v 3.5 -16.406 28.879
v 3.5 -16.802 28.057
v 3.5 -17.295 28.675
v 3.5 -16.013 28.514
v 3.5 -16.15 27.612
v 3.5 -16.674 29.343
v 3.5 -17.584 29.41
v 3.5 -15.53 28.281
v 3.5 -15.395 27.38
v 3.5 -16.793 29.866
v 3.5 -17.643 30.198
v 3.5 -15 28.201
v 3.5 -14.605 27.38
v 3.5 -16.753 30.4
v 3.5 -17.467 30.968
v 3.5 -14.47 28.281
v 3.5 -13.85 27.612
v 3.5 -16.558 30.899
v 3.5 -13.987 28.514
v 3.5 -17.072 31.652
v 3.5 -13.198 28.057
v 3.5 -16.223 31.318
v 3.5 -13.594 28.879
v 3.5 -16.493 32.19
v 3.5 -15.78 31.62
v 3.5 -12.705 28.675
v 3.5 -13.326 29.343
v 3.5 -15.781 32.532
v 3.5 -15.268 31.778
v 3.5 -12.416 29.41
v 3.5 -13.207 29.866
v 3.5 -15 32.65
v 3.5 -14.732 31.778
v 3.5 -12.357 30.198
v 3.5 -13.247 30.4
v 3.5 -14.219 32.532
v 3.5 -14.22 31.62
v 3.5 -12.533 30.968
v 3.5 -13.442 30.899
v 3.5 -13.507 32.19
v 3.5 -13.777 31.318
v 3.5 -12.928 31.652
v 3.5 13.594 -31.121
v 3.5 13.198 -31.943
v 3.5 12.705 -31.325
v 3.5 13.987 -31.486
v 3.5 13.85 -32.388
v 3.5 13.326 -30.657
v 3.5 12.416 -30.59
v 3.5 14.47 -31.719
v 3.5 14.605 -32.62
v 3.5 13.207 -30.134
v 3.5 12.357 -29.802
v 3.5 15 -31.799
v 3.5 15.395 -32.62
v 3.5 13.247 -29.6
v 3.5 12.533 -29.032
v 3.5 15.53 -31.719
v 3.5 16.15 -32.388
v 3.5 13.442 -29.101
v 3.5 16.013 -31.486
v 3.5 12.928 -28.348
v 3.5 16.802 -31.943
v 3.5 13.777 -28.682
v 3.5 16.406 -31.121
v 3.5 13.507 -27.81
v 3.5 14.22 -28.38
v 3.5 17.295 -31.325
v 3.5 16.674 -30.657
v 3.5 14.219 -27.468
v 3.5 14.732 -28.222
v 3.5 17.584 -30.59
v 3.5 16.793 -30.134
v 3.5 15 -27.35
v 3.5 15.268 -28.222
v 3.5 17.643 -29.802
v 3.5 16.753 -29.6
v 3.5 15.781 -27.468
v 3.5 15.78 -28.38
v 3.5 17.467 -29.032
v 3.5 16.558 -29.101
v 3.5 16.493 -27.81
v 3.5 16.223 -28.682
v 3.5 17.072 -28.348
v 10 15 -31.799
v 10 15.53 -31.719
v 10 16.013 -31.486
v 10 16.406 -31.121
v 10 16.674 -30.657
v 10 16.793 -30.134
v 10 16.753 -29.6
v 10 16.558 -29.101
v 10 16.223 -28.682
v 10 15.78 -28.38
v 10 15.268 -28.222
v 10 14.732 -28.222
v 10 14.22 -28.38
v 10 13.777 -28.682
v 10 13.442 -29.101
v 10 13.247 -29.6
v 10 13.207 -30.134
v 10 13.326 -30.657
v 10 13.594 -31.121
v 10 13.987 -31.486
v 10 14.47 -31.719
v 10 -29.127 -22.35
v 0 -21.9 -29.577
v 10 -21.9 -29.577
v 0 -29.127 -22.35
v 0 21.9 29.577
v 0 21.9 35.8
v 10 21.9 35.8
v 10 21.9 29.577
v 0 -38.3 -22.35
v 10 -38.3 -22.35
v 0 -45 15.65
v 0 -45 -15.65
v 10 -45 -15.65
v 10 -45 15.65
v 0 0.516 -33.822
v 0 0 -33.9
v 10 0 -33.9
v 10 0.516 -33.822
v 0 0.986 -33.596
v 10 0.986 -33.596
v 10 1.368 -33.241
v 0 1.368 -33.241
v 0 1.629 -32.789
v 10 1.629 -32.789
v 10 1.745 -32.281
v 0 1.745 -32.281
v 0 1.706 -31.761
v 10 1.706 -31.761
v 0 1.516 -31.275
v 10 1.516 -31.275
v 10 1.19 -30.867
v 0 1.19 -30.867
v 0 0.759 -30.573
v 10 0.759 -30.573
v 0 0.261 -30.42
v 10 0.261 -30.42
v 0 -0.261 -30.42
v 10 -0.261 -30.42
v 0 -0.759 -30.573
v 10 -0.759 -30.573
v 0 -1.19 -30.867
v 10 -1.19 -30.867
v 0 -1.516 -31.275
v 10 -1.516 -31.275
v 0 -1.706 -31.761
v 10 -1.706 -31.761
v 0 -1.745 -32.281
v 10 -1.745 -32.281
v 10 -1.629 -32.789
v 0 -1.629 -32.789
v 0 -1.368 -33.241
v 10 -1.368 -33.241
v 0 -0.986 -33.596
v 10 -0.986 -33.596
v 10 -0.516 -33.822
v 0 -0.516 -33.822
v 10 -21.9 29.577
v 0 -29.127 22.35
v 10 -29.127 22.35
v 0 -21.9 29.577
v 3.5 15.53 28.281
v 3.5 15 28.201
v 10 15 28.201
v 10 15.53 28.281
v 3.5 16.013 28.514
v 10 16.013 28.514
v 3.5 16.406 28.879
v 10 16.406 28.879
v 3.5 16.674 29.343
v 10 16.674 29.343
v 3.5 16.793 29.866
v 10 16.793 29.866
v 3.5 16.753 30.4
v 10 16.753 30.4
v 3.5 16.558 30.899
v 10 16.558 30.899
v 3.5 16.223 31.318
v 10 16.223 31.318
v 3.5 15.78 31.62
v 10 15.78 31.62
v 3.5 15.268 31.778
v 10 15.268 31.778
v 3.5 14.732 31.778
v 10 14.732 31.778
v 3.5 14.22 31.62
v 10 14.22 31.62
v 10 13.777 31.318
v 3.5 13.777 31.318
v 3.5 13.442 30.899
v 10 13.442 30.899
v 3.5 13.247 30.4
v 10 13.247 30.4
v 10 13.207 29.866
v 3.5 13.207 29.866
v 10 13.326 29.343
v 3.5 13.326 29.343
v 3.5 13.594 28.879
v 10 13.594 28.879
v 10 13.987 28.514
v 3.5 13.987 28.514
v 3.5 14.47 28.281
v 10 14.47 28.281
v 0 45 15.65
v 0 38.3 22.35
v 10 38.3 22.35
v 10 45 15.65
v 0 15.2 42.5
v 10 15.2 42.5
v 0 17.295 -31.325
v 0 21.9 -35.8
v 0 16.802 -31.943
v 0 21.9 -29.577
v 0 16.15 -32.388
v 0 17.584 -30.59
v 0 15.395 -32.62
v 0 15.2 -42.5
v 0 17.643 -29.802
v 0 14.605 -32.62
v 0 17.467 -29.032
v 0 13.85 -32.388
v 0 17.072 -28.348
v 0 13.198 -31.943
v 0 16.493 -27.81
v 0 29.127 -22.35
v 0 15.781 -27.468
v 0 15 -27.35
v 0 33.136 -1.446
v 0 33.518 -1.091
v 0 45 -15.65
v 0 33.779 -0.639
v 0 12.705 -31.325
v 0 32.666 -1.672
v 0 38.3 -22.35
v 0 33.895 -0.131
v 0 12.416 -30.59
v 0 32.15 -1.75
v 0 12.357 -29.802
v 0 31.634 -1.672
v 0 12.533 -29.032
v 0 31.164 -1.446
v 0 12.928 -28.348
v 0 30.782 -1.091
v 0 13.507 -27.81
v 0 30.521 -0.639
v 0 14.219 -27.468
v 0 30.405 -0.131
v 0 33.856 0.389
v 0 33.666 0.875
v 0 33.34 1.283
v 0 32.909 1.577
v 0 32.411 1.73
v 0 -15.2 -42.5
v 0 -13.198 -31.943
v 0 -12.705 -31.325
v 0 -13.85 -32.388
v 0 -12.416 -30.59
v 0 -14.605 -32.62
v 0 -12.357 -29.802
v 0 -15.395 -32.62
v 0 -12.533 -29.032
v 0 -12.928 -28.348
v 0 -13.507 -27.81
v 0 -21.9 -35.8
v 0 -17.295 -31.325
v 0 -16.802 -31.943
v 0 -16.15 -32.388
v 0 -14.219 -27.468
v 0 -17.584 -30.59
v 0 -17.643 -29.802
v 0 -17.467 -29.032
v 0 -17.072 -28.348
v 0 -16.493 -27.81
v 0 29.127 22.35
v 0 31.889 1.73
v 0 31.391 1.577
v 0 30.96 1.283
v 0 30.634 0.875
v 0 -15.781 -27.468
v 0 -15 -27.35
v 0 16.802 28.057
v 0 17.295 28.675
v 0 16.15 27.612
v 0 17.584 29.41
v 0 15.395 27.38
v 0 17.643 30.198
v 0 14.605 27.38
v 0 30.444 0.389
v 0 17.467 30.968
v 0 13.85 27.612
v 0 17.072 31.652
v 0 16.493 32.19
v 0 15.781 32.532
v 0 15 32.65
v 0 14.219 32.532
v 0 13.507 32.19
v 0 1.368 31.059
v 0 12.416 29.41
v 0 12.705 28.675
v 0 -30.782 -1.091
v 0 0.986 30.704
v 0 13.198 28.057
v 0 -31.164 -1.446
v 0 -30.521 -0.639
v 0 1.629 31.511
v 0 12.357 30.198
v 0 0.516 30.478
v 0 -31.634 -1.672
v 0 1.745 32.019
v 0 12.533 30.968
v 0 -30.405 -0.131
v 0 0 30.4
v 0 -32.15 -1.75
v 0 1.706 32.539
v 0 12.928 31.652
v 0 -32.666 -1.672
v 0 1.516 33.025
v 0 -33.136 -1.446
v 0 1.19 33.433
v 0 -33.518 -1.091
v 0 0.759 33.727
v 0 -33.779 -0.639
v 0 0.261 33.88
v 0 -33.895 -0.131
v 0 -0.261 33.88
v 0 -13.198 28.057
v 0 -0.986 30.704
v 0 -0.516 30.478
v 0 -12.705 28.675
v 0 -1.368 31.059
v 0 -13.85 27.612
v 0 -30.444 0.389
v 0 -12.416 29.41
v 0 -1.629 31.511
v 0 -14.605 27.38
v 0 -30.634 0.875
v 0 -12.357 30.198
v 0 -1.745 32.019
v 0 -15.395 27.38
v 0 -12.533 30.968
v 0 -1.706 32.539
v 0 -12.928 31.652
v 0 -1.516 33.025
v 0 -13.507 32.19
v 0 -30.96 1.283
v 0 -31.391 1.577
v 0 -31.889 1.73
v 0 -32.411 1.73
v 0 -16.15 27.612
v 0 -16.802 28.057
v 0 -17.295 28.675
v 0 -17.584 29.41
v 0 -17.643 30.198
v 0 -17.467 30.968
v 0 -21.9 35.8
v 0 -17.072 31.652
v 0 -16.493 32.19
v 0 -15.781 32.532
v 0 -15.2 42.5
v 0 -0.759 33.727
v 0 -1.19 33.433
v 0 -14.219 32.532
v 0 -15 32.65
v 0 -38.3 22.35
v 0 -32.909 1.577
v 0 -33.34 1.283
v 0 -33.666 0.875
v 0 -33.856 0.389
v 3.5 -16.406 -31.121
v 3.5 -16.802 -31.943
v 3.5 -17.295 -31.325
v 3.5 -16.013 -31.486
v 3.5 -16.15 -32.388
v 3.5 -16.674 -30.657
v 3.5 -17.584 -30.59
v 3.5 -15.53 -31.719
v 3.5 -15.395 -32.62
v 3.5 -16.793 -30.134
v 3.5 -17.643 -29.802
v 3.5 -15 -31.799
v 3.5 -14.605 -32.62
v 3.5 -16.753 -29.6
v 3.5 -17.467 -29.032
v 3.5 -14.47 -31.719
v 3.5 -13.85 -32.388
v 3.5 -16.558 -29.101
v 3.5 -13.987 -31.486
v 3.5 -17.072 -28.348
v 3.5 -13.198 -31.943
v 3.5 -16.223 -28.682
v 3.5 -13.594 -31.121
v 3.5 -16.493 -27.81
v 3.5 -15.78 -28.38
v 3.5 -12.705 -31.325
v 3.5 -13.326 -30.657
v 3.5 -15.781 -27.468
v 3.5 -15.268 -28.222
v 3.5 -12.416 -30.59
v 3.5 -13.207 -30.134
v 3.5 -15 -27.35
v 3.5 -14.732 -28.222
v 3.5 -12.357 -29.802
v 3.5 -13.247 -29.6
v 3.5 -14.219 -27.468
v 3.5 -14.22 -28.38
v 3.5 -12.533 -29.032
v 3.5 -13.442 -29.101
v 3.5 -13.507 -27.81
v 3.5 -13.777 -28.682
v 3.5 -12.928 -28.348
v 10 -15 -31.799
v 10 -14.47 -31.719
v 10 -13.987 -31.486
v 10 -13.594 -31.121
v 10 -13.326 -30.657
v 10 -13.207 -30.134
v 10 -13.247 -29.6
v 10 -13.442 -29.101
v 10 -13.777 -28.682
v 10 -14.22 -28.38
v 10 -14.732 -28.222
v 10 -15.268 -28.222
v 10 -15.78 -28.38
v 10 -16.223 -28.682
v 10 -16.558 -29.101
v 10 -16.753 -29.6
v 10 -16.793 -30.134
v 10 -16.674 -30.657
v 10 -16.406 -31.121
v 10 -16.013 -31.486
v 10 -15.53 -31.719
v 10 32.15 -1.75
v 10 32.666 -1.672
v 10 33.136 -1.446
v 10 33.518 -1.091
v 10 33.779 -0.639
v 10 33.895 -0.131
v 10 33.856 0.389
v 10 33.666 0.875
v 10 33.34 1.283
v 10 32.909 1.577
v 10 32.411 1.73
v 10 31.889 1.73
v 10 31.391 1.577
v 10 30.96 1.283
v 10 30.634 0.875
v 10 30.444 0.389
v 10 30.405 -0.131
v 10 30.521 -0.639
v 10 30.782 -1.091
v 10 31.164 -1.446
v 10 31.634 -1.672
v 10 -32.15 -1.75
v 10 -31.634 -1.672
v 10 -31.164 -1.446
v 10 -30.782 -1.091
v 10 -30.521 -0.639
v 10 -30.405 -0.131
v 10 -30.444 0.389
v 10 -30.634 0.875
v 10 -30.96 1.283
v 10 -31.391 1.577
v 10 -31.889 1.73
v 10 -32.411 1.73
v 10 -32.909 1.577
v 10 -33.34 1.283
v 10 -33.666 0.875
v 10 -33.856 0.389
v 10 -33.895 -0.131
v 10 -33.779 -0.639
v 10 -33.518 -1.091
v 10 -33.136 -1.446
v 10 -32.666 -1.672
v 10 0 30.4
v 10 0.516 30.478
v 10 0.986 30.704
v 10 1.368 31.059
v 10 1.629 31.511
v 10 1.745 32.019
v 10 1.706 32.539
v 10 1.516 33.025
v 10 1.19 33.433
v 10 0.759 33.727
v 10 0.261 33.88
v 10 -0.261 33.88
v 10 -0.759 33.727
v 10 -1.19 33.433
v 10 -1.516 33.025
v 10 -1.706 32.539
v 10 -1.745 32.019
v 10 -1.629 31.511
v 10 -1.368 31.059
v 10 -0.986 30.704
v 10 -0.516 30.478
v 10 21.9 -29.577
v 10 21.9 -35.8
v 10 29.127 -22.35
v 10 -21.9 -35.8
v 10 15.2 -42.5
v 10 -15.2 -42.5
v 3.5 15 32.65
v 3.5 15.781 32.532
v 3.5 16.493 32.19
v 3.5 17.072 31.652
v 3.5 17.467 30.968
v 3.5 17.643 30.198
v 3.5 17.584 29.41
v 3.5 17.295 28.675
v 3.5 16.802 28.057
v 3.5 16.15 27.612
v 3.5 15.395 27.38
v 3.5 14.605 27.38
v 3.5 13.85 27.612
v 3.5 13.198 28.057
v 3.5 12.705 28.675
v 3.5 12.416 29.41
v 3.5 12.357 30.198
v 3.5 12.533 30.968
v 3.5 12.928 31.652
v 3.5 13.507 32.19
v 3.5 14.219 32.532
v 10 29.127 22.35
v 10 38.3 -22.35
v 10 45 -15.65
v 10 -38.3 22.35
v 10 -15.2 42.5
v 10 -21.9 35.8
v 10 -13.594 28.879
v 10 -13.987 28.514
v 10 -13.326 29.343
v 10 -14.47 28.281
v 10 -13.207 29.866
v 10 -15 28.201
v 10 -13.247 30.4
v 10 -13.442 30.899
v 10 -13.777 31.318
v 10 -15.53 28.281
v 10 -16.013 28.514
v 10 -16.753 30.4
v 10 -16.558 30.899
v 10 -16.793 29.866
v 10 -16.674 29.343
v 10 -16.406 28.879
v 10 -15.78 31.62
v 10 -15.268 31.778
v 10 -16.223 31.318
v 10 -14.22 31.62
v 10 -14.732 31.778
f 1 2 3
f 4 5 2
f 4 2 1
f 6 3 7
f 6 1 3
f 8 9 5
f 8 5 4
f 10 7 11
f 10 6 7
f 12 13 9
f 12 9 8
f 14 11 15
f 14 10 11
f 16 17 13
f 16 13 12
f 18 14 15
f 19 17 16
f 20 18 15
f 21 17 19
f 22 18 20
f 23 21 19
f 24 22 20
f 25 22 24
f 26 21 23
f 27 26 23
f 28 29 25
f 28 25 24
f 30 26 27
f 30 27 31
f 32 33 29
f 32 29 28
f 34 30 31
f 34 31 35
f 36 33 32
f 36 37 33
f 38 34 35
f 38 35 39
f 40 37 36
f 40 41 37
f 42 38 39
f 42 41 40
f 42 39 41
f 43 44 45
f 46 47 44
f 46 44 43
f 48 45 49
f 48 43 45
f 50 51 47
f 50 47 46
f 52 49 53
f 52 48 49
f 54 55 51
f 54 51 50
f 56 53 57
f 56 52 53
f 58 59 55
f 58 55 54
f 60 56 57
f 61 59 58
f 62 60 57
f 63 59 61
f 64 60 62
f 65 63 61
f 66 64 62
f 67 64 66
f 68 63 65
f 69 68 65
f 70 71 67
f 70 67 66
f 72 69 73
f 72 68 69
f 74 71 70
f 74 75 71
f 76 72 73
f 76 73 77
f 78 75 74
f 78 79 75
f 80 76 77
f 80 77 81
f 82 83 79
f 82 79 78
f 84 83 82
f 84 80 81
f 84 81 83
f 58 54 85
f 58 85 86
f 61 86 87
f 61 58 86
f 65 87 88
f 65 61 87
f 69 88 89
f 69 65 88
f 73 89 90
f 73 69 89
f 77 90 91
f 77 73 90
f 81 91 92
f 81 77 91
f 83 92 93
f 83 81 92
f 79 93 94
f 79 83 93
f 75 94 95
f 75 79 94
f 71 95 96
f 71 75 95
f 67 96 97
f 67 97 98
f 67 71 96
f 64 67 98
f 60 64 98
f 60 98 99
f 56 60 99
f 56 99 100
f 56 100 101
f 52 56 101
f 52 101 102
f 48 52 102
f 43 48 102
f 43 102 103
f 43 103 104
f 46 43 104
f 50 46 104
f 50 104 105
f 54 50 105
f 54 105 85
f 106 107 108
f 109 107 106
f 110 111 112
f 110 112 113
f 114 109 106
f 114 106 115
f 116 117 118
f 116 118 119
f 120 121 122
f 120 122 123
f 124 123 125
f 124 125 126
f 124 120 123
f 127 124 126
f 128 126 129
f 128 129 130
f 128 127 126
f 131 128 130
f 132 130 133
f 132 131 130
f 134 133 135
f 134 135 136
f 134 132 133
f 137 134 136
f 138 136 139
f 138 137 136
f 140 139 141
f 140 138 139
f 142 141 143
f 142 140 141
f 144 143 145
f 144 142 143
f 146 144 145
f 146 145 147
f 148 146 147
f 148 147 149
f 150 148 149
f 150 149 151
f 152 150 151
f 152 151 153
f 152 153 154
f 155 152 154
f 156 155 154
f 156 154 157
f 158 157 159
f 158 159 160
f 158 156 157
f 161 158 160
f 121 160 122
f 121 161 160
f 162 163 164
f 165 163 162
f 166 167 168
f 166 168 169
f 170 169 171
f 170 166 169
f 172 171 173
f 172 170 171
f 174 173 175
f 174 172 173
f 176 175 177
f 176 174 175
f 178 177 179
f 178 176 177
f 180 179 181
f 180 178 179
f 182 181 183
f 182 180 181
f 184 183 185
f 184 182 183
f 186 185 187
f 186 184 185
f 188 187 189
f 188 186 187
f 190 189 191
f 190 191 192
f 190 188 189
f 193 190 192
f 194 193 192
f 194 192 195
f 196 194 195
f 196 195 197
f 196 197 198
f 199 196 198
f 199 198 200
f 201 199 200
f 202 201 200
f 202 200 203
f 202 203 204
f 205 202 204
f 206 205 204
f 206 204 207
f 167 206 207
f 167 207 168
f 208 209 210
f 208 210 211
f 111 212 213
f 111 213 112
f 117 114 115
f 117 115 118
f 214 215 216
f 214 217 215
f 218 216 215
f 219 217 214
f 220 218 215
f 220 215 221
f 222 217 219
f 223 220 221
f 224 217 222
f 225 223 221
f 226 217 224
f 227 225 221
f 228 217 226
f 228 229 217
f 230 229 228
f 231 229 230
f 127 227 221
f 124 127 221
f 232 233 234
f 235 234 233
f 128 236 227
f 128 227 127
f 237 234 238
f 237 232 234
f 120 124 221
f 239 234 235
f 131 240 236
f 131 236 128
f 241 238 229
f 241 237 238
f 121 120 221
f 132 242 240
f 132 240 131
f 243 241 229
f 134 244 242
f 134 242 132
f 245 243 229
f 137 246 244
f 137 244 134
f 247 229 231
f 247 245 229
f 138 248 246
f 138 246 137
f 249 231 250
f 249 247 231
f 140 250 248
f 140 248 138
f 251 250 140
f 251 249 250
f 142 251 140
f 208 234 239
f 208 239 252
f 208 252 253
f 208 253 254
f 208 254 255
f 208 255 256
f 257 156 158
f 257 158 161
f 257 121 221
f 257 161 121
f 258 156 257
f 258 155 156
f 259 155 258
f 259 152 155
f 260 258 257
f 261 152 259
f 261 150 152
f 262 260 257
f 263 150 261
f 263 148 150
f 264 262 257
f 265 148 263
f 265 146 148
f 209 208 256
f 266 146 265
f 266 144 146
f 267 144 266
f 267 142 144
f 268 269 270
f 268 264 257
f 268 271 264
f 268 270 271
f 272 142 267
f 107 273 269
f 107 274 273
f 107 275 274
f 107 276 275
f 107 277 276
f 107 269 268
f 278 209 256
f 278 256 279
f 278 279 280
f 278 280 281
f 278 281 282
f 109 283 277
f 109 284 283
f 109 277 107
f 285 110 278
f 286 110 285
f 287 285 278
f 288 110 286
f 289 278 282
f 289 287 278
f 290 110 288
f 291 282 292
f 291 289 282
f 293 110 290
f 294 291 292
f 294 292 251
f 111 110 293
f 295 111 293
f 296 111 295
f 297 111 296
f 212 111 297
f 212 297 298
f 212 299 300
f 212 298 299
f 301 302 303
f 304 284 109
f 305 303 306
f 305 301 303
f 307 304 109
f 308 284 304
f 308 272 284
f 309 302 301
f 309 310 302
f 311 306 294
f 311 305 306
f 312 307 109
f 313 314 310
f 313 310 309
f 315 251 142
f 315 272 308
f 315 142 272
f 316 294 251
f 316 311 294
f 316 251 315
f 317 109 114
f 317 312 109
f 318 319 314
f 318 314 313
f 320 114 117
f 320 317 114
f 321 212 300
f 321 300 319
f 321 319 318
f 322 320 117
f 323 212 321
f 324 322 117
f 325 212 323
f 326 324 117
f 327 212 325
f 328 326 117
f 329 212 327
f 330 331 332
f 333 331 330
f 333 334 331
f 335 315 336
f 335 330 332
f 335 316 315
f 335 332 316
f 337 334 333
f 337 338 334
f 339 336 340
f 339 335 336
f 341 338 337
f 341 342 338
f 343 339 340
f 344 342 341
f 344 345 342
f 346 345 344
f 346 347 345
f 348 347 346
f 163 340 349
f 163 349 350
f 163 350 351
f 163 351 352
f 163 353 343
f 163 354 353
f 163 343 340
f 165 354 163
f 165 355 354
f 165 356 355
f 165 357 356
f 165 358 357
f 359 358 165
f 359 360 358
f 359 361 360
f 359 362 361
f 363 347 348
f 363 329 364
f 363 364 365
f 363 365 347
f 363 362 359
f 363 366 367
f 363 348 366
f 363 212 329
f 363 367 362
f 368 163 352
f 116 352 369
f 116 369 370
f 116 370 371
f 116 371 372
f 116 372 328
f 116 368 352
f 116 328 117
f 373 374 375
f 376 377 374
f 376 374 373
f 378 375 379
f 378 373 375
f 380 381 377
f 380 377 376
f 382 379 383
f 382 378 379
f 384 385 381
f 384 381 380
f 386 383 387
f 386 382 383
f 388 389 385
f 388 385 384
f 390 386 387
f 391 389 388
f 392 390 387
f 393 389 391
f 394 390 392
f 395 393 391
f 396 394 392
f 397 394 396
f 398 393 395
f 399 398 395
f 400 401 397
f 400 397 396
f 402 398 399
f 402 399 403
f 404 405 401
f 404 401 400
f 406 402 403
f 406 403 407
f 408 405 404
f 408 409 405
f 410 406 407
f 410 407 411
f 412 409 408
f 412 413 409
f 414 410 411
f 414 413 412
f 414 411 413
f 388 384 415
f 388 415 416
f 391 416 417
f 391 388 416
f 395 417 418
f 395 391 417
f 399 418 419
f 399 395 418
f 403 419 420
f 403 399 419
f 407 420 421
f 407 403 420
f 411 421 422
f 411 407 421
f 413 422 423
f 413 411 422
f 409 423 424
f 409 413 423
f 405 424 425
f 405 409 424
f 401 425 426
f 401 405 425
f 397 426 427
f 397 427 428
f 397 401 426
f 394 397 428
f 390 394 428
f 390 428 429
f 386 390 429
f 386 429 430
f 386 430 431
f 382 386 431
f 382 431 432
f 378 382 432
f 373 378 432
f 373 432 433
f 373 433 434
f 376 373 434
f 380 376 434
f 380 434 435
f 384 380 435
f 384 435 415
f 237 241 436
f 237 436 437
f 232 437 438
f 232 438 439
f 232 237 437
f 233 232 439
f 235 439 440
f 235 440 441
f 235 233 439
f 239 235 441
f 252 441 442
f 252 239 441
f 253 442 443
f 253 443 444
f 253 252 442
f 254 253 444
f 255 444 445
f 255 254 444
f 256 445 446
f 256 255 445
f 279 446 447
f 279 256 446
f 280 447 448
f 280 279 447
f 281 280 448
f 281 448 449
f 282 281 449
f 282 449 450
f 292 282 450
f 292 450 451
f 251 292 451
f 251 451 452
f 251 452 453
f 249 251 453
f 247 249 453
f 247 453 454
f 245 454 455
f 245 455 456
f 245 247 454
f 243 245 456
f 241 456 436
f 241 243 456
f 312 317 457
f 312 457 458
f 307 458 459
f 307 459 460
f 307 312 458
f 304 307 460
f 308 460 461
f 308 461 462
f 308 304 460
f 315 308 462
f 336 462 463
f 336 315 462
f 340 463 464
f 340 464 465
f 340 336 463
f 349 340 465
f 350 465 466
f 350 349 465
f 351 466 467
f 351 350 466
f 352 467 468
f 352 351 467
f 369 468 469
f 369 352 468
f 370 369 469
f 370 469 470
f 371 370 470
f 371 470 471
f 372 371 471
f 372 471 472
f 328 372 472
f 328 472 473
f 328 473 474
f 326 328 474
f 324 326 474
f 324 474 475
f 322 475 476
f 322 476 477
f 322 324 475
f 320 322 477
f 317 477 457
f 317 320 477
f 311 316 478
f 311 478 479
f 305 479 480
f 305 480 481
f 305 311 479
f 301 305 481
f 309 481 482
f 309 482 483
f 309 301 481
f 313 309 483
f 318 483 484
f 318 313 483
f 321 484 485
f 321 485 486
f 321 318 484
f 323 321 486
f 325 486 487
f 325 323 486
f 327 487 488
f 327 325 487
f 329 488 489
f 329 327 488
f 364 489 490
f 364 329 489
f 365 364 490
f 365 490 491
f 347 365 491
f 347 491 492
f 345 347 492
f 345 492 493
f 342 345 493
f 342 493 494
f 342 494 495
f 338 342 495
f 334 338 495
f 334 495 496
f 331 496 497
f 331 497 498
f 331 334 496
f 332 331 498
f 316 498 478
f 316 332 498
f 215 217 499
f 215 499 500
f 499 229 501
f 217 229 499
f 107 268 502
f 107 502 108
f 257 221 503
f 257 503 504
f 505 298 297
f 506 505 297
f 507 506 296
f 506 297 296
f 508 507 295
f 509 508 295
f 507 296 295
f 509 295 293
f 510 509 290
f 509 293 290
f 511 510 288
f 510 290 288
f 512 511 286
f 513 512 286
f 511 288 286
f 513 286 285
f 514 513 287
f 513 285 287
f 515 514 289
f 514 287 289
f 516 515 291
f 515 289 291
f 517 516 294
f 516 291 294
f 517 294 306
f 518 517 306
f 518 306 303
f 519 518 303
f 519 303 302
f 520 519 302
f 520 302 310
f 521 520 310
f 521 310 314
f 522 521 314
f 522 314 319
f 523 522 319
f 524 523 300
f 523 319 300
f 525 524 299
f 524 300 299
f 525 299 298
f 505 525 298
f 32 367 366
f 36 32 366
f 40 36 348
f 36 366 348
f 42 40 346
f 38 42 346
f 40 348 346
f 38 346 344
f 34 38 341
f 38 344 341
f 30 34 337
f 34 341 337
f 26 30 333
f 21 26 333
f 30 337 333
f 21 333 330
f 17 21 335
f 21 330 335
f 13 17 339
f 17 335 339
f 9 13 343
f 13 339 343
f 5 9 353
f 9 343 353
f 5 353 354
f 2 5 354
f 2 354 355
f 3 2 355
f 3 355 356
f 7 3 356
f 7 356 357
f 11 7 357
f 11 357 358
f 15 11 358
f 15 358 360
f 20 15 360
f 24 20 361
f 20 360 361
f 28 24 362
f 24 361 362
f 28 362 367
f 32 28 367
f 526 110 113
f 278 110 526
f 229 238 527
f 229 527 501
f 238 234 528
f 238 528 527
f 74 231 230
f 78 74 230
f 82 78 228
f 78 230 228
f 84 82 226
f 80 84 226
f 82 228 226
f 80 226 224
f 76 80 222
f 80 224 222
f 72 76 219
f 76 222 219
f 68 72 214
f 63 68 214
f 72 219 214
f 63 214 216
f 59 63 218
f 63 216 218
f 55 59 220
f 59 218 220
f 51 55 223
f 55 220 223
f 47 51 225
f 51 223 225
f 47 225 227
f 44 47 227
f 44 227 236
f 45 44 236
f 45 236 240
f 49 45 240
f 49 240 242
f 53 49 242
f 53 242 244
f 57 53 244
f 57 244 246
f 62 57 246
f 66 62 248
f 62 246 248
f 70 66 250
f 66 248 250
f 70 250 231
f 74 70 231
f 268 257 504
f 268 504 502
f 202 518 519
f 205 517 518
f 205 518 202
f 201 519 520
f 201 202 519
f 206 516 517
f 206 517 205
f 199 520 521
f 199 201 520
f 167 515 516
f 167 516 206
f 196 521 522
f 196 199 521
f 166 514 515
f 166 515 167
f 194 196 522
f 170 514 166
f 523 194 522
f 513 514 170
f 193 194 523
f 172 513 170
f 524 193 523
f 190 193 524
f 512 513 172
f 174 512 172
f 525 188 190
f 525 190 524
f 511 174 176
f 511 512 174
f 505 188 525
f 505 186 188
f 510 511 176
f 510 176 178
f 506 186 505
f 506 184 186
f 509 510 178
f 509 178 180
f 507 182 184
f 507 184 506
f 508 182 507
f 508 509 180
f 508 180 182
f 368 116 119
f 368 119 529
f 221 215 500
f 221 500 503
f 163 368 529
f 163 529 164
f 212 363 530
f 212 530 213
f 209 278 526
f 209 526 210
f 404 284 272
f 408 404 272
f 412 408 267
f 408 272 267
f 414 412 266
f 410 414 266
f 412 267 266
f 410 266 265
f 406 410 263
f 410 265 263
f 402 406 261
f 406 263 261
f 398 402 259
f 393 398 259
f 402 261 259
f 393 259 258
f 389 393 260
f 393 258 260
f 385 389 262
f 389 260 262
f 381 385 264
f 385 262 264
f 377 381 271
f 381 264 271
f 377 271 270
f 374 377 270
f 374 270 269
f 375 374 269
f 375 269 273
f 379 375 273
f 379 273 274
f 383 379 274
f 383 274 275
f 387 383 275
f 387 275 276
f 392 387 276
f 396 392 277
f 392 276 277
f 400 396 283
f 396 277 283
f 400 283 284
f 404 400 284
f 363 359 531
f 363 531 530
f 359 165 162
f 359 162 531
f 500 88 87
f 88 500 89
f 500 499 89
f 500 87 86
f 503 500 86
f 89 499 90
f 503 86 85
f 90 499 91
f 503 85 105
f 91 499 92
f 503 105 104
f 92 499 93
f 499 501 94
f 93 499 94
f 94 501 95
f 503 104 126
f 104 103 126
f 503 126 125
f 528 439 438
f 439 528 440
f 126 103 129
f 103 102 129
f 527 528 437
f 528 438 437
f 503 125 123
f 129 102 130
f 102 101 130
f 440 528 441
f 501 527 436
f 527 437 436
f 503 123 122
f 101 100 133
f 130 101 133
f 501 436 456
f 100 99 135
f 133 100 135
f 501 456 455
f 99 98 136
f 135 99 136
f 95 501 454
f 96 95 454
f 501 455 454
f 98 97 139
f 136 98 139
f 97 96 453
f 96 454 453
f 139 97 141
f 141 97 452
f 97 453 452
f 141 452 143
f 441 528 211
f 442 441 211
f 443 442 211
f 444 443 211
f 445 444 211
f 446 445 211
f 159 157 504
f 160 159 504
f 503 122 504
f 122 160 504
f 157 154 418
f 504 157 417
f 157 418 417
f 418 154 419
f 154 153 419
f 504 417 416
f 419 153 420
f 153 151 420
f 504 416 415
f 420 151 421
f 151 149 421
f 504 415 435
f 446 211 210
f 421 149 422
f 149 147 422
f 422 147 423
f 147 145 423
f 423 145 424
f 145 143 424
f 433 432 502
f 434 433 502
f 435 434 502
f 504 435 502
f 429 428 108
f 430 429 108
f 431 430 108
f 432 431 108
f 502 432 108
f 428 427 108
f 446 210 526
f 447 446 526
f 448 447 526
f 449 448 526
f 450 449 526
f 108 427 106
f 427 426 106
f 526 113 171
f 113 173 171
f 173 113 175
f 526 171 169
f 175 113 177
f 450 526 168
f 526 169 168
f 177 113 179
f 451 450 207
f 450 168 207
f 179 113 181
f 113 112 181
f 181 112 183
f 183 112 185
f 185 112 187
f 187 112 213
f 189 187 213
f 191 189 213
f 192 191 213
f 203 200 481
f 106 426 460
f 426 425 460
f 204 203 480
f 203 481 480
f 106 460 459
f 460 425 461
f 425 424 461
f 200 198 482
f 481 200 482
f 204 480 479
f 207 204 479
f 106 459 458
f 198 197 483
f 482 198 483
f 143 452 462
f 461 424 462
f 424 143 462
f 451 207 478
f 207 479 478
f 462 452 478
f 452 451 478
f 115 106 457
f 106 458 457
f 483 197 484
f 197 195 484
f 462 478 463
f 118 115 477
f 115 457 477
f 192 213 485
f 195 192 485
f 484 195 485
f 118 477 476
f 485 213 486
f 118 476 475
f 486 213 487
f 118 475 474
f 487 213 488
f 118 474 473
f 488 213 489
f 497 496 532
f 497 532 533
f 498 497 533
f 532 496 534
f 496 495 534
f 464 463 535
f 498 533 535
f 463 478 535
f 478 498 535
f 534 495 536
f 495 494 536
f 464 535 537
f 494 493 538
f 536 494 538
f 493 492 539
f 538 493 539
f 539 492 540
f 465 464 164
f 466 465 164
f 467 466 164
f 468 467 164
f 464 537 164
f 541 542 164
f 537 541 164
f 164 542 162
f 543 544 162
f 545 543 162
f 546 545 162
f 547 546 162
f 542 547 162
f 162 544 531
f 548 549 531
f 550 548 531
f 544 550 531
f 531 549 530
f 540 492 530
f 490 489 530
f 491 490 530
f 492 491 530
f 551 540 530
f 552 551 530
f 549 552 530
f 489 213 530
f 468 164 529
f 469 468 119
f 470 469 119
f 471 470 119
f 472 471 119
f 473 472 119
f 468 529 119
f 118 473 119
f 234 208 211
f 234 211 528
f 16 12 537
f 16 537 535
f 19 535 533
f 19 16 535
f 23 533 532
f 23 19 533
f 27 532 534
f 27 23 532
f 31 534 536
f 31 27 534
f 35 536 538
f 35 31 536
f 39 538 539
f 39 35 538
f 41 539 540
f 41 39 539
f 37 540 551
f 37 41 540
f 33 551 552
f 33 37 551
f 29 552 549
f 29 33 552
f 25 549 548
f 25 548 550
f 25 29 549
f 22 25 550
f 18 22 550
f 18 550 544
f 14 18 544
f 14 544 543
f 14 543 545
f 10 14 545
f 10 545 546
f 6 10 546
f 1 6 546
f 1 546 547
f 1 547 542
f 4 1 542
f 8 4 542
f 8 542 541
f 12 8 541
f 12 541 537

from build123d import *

# Parameters (mm, degrees)
SKETCH1_R           = 1.75
SKETCH1_R_2         = 1.798521792
BOSS_EXTRUDE1_DEPTH = 10
SKETCH2_R           = 2.65
CUT_EXTRUDE1_DEPTH  = 3.5


with BuildPart() as part:
    # Sketch1 → Boss-Extrude1 (new body)
    with BuildSketch(Plane.YZ):
        Polygon((-45, -15.65), (-45, 15.65), (-38.3, 22.35), (-29.12737367, 22.35), (-21.9, 29.57737367), (-21.9, 35.8), (-15.2, 42.5), (15.2, 42.5), (21.9, 35.8), (21.9, 29.57737367), (29.12737367, 22.35), (38.3, 22.35), (45, 15.65), (45, -15.65), (38.3, -22.35), (29.12737367, -22.35), (21.9, -29.57737367), (21.9, -35.8), (15.2, -42.5), (-15.2, -42.5), (-21.9, -35.8), (-21.9, -29.57737367), (-29.12737367, -22.35), (-38.3, -22.35), align=None)
        with Locations(Location((0, 32.15, 0), (0, 0, 270))):
            Circle(SKETCH1_R, mode=Mode.SUBTRACT)
        with Locations(Location((-32.15, 0, 0), (0, 0, 270))):
            Circle(SKETCH1_R, mode=Mode.SUBTRACT)
        with Locations(Location((0, -32.15, 0), (0, 0, 270))):
            Circle(SKETCH1_R, mode=Mode.SUBTRACT)
        with Locations(Location((32.15, 0, 0), (0, 0, 270))):
            Circle(SKETCH1_R, mode=Mode.SUBTRACT)
        with Locations(Location((-15, 30, 0), (0, 0, 270))):
            Circle(SKETCH1_R_2, mode=Mode.SUBTRACT)
        with Locations(Location((15, 30, 0), (0, 0, 270))):
            Circle(SKETCH1_R_2, mode=Mode.SUBTRACT)
        with Locations(Location((15, -30, 0), (0, 0, 270))):
            Circle(SKETCH1_R_2, mode=Mode.SUBTRACT)
        with Locations(Location((-15, -30, 0), (0, 0, 270))):
            Circle(SKETCH1_R_2, mode=Mode.SUBTRACT)
    extrude(amount=BOSS_EXTRUDE1_DEPTH)

    # Sketch2 → Cut-Extrude1 (cut)
    with BuildSketch(Plane(origin=(0, 0, 0), x_dir=(0, -1, 0), z_dir=(-1, 0, 0))):
        with Locations(Location((-15, 30, 0), (0, 0, 90))):
            Circle(SKETCH2_R)
        with Locations(Location((15, 30, 0), (0, 0, 90))):
            Circle(SKETCH2_R)
        with Locations(Location((15, -30, 0), (0, 0, 90))):
            Circle(SKETCH2_R)
        with Locations(Location((-15, -30, 0), (0, 0, 90))):
            Circle(SKETCH2_R)
    extrude(amount=-CUT_EXTRUDE1_DEPTH, mode=Mode.SUBTRACT)


solid = part.part
